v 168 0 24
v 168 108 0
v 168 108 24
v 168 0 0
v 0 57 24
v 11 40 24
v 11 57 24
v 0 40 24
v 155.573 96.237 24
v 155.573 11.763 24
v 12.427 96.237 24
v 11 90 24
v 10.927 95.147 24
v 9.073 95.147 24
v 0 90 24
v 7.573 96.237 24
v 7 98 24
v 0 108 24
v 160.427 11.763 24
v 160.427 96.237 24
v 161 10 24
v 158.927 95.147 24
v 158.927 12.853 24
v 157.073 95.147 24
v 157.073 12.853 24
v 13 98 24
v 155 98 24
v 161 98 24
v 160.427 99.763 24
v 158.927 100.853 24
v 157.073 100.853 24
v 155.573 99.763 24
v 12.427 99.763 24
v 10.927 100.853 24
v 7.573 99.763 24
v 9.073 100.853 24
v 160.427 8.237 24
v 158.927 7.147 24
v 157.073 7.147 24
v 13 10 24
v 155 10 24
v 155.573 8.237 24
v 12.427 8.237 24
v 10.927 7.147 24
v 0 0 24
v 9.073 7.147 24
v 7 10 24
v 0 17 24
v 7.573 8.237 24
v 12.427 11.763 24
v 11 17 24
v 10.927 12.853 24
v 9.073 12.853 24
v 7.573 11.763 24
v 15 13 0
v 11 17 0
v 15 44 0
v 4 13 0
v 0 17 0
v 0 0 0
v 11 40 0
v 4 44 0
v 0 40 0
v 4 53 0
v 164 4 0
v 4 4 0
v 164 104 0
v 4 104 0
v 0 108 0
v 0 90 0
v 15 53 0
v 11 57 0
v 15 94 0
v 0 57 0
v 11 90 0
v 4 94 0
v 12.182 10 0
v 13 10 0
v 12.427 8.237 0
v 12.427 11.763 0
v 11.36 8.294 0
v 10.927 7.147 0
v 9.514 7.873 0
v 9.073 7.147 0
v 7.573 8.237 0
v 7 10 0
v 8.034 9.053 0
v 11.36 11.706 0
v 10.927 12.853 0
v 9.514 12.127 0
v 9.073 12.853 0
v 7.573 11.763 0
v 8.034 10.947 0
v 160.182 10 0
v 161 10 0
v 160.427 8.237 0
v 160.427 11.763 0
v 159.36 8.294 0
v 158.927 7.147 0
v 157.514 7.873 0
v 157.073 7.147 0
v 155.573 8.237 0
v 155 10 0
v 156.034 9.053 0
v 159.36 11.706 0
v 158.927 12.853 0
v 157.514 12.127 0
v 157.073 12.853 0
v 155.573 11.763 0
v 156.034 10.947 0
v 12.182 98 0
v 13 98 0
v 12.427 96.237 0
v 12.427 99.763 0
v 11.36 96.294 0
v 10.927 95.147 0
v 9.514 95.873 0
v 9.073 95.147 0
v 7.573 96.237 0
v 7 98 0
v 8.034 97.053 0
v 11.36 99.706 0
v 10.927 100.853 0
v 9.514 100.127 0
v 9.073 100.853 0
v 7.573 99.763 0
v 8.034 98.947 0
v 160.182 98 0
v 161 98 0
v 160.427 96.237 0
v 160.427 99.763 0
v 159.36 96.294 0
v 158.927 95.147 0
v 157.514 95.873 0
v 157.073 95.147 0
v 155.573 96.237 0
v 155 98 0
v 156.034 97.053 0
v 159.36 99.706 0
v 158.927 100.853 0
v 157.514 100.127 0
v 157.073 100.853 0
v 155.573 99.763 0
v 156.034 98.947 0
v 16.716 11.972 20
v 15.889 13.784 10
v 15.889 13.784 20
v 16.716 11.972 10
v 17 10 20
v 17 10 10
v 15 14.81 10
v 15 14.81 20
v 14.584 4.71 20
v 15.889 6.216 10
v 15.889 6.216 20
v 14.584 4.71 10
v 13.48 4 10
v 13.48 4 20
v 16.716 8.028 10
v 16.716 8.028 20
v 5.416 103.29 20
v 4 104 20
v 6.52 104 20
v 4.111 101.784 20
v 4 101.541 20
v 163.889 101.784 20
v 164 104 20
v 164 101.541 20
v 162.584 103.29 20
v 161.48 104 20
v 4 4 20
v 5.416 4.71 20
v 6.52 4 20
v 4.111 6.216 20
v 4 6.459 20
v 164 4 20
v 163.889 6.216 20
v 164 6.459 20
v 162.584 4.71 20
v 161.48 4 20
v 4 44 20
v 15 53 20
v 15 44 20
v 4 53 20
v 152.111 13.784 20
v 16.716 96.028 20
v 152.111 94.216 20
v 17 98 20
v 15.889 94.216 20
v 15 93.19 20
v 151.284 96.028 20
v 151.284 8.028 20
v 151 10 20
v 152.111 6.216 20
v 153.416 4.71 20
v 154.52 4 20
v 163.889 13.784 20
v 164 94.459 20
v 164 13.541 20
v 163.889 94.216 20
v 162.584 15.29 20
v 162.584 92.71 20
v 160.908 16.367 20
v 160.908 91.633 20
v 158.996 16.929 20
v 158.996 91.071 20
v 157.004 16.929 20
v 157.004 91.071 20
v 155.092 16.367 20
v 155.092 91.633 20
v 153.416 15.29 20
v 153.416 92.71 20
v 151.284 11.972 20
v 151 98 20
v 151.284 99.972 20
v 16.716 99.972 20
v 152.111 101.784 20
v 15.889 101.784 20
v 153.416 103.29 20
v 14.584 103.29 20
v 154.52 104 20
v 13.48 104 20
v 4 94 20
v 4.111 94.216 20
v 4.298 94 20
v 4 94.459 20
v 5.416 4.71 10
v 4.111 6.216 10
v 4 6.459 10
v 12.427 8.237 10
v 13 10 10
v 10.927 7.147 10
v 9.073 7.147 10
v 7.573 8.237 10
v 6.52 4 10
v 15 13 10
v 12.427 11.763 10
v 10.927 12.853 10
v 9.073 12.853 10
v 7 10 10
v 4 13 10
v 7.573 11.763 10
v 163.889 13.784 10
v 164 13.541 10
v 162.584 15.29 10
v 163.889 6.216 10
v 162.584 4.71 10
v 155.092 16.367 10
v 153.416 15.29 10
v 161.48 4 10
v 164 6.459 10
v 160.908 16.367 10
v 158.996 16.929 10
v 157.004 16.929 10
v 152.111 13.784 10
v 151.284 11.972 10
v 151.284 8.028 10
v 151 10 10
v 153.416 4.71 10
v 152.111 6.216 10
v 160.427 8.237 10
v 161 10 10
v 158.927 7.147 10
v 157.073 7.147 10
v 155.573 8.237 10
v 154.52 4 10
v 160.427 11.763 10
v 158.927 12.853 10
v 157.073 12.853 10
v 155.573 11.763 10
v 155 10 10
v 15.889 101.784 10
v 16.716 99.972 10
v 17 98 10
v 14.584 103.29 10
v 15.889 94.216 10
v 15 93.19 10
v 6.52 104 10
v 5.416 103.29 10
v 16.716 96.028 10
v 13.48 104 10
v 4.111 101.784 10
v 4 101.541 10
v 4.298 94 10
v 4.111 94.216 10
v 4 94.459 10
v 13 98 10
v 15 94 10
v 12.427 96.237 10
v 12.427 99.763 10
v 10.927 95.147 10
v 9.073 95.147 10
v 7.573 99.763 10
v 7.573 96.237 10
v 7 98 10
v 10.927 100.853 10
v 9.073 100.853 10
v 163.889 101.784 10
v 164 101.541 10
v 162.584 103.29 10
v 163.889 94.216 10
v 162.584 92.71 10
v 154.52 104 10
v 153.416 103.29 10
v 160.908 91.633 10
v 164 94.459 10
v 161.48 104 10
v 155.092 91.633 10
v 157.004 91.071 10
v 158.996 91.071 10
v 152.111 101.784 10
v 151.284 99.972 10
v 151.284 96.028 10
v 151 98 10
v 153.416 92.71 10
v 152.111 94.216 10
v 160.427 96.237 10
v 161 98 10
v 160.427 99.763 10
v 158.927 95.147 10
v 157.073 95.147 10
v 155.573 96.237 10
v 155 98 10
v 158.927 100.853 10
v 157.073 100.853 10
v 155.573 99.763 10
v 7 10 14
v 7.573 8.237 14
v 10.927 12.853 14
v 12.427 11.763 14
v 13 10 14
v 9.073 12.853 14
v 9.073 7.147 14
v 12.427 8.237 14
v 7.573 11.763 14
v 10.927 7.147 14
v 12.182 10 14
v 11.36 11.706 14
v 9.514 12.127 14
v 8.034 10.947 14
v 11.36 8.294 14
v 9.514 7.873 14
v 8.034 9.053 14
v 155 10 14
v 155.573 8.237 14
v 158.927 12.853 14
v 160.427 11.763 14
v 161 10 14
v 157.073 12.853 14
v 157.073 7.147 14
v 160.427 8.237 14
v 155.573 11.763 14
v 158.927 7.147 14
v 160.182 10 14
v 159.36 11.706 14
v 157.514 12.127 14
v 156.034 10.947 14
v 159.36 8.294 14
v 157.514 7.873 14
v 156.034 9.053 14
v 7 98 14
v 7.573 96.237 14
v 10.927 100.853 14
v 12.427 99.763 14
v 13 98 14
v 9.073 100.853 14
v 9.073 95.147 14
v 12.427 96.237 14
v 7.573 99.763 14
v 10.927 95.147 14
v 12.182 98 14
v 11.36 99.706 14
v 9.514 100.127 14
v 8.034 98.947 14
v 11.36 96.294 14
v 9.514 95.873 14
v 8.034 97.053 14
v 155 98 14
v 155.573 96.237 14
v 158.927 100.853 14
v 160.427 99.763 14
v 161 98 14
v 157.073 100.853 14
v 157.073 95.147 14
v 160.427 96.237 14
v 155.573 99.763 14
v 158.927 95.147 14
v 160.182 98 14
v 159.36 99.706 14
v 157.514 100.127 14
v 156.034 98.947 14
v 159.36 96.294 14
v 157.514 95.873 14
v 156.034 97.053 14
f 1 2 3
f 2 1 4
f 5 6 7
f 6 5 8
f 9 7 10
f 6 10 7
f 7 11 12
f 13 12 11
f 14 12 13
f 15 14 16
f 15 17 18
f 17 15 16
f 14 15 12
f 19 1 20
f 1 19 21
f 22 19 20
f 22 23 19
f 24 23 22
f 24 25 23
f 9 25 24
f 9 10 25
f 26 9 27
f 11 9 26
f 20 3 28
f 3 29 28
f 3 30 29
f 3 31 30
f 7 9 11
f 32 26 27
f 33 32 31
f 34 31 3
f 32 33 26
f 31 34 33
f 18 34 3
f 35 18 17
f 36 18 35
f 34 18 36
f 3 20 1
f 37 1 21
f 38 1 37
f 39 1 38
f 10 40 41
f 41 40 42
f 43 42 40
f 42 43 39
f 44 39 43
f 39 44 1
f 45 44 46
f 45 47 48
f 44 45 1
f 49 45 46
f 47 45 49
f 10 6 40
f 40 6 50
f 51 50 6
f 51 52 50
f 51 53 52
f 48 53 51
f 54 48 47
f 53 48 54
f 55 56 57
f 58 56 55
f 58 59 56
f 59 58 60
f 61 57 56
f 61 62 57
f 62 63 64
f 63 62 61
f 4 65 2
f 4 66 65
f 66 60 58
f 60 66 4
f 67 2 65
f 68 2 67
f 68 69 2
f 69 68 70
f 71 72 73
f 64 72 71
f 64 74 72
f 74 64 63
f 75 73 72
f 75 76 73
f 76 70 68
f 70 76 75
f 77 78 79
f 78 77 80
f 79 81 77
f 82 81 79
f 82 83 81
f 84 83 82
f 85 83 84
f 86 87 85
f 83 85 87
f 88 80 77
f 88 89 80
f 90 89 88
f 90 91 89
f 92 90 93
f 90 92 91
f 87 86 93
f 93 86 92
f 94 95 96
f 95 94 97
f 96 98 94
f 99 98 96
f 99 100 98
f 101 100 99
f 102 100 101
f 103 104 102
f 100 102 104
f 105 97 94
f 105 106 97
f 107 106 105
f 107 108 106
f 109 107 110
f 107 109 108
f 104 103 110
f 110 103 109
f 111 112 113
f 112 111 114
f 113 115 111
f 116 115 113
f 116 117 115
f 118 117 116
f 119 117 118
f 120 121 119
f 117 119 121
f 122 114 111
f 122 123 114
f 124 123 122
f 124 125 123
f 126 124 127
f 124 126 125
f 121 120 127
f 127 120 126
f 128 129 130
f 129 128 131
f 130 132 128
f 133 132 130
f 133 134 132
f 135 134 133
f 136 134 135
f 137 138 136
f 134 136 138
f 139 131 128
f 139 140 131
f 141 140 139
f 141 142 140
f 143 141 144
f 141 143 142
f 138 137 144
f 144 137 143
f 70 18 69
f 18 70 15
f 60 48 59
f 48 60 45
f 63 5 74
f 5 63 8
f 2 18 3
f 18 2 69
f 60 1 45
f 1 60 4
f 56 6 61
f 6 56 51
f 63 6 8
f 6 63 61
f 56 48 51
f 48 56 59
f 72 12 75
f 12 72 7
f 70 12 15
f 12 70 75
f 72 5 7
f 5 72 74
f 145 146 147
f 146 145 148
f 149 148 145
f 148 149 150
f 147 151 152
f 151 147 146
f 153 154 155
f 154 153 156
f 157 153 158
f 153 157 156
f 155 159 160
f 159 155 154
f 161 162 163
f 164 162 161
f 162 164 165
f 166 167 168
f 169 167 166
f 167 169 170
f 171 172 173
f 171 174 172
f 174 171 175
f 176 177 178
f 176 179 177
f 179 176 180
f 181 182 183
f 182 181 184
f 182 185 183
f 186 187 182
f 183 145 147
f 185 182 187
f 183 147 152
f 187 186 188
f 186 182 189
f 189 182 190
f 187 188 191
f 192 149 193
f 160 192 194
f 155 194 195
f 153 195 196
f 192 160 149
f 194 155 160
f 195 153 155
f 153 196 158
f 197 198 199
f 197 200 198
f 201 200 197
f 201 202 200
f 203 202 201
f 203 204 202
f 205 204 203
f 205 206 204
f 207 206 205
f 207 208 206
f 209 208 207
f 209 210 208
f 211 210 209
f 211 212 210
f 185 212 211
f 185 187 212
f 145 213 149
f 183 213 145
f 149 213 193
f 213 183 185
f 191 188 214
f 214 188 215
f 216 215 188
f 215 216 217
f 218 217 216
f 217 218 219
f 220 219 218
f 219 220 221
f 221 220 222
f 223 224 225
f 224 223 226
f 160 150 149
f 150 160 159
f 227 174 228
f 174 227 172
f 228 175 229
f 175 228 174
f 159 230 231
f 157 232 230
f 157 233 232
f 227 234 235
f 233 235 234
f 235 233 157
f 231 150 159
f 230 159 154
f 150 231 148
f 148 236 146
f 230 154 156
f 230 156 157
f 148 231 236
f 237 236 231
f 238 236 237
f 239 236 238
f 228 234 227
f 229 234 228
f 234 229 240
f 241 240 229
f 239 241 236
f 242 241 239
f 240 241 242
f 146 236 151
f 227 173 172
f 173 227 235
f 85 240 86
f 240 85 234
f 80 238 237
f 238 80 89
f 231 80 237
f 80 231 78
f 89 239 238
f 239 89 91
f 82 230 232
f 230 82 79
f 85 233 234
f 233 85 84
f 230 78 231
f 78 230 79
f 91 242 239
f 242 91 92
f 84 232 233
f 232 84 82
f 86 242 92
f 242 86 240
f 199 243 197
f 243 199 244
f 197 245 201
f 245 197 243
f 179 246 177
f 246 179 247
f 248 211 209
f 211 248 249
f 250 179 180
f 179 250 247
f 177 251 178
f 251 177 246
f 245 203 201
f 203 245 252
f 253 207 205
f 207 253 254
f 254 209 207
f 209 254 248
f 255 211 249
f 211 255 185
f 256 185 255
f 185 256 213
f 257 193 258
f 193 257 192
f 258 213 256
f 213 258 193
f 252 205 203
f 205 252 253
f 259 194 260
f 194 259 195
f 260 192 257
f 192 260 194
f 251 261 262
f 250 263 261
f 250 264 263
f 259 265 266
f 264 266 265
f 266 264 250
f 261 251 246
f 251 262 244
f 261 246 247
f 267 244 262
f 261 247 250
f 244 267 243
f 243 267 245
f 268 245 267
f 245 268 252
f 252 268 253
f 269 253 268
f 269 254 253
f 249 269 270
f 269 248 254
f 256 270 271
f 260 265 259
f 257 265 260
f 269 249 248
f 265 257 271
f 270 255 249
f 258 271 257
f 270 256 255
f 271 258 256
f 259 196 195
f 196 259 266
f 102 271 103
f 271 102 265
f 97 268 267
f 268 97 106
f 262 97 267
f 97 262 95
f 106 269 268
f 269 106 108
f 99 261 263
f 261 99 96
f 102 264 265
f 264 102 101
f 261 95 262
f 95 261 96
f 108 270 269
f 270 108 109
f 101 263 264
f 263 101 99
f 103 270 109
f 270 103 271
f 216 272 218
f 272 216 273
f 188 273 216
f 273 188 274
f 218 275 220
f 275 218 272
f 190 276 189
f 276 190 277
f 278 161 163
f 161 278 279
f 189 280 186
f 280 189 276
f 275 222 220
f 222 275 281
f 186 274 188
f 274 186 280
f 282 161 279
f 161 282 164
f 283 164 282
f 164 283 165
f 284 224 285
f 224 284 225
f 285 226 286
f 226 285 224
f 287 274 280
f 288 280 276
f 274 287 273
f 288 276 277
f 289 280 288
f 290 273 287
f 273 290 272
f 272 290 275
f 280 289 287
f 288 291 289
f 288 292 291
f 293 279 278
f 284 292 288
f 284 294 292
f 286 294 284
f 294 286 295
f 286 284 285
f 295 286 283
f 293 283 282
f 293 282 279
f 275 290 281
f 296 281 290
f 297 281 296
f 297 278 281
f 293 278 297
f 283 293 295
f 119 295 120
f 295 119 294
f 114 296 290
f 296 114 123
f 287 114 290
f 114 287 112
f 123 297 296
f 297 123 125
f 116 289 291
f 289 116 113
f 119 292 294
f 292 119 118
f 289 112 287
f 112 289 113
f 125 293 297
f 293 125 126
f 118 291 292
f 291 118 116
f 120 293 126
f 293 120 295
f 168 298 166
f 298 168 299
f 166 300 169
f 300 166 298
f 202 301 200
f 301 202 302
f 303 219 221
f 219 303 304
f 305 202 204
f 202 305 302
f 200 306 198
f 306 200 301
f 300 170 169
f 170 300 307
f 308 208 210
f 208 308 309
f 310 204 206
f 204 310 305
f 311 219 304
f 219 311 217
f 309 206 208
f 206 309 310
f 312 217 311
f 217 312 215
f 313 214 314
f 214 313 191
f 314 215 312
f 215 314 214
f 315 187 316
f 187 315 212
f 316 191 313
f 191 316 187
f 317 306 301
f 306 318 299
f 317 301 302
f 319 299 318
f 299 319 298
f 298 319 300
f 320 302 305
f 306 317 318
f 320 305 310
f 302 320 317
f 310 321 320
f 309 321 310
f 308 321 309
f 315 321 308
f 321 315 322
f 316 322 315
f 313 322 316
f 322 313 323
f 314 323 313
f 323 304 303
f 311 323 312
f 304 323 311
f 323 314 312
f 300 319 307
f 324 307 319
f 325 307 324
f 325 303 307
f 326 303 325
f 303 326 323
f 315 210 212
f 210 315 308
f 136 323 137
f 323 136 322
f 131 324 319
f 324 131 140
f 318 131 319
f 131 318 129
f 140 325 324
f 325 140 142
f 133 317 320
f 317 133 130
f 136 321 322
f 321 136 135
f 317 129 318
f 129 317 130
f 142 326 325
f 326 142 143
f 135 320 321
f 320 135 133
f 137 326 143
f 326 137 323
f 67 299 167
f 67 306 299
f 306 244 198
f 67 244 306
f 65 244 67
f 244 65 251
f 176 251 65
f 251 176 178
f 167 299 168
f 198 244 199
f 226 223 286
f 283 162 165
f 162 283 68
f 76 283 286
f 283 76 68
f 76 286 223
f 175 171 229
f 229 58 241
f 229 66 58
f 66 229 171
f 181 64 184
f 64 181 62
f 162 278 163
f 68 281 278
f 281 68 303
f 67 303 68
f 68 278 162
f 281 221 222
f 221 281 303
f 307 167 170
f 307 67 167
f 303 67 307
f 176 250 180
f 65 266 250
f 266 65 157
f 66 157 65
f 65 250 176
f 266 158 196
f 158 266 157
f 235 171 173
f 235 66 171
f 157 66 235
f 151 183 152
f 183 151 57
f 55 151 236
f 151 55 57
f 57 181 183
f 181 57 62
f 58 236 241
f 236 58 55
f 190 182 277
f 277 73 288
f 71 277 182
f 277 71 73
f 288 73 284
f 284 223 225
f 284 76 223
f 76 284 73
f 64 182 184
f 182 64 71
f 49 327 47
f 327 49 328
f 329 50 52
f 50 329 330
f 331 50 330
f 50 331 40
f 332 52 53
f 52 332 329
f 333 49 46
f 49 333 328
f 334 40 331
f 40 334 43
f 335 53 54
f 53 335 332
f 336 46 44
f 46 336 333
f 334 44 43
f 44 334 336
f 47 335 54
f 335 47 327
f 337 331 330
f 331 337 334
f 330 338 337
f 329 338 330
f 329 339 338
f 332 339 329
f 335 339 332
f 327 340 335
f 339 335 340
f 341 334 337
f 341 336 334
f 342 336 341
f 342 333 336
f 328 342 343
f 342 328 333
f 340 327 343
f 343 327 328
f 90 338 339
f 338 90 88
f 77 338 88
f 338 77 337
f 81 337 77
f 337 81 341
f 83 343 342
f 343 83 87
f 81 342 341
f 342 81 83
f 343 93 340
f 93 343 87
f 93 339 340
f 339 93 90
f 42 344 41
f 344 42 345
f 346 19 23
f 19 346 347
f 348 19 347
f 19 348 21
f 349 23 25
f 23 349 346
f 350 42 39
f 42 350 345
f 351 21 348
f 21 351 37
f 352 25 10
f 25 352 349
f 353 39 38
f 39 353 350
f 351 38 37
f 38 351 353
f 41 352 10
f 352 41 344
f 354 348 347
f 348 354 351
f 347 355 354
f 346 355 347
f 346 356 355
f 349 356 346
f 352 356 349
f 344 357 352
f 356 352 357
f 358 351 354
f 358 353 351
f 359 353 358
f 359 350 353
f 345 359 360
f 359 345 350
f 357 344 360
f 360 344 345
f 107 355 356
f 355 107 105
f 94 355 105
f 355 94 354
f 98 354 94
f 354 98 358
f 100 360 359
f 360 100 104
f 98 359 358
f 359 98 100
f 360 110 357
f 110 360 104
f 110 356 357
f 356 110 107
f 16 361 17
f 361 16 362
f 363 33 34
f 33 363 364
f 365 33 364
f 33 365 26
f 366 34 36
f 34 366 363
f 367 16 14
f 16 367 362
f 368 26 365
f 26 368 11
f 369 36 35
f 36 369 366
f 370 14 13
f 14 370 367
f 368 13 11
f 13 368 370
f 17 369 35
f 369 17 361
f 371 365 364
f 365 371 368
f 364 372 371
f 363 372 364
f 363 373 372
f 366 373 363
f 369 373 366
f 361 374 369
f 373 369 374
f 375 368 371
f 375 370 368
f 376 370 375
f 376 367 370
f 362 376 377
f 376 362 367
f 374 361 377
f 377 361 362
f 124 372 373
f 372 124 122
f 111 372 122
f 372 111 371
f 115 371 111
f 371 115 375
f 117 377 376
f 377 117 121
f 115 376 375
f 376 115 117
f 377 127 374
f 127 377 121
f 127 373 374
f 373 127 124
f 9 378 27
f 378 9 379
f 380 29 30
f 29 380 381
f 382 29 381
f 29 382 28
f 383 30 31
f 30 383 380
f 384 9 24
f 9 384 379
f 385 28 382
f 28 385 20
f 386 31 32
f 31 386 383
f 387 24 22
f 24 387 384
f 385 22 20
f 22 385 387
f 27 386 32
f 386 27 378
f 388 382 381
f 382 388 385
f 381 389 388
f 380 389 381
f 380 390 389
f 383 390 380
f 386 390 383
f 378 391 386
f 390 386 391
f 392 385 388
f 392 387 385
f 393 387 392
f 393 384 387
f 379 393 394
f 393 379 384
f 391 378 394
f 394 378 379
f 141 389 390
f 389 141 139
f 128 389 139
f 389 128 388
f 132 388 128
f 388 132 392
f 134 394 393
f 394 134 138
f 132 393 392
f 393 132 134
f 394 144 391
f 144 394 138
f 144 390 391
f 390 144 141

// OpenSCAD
/* Top portion of the enclosure for:
 * Sequential Turn Signal
 *
 * This part can be constructed out of metal, plastic, or wood,
 * but metal is recommended.  The enclosure should be mounted in
 * a dry, well-ventilated area as it will not prevent moisture
 * ingress or provide thermal insulation for the electronics.
 */

inner_x = 160;          // Interior dimension of enclosure in x direction.
inner_y = 100;          // Interior dimension of enclosure in y direction.
inner_z = 20;           // Interior dimension of enclosure in z direction.
inner_z_min = 10;        // Minimum distance between top of enclosure and PCB.
wall_d = 4;             // Enclosure wall thickness.
mount_r = 3;            // Radius of PCB mounting posts.
screw_inset = 6;        // Distance from closest edge of PCB to center of screw.
screw_r = 3;            // Screw head radius.
thread_outer_r = 2.182; // Mounting screw outer radius.
pwr_inset_x = 11;       // Size of power connector in x direction.
pwr_inset_y = 23;       // Size of power connector in the y direction.
pwr_offset = 13;        // Offset from origin along y axis to power connector.
sig_inset_x = 11;       // Size of signal connector in x direction.
sig_inset_y = 33;       // Size of signal connector in y direction.
sig_offset = 53;        // Offset from origin along y axis to signal connector.
eps = 0.001;            // Epsilon constant to ensure overlap for difference().

// The top portion of the enclosure.
module top()
{

  // Exterior shell of the top of the enclosure.
  module exterior()
  {
    difference()
    {
      cube([inner_x + 2 * wall_d, inner_y + 2 * wall_d, inner_z + wall_d]);
      translate([-eps, pwr_offset + wall_d, -eps])
      {
        cube([pwr_inset_x + eps, pwr_inset_y, inner_z + wall_d + 2 * eps]);
      }
      translate([-eps, sig_offset + wall_d, -eps]) {
         cube([sig_inset_x + eps, sig_inset_y, inner_z + wall_d + 2 * eps]);
      }
    }
  }

  // Mounting stub which contacts the PCB at the screw holes.
  module mount()
  {
    translate([0, 0, inner_z_min])
    {
      cylinder(r=screw_r + wall_d, h=inner_z_min);
    }
    cylinder(r=mount_r, h=inner_z);
  }

  // Interior volume of the top of the enclosure.
  module interior()
  {
    difference()
    {
      translate([0, 0, -eps]) cube([inner_x, inner_y, inner_z + eps]);
      translate([-eps, pwr_offset - wall_d, -2 * eps])
      {
        cube([pwr_inset_x + eps, pwr_inset_y + 2 * wall_d, inner_z + 4 * eps]);
      }
      translate([-eps, sig_offset - wall_d, -2 * eps])
      {
        cube([sig_inset_x + eps, sig_inset_y + 2 * wall_d, inner_z + 4 * eps]);
      }
      translate([screw_inset, screw_inset, 0]) mount();
      translate([inner_x - screw_inset, screw_inset, 0]) mount();
      translate([screw_inset, inner_y - screw_inset, 0]) mount();
      translate([inner_x - screw_inset, inner_y - screw_inset, 0]) mount();
    }
  }

  // Holes for screws to attach the top and bottom portions of the enclosure.
  module screw_holes()
  {

    // Screw hole centered on the origin.
    module hole()
    {
      translate([0, 0, inner_z_min + wall_d])
      {
        cylinder(r=screw_r, h=inner_z_min + wall_d);
      }
      translate([0, 0, -eps])
      {
        cylinder(r=thread_outer_r, h=inner_z + wall_d + eps);
      }
    }

    // Copy the hole at the correct locations.
    translate([screw_inset, screw_inset, 0]) hole();
    translate([inner_x - screw_inset, screw_inset, 0]) hole();
    translate([screw_inset, inner_y - screw_inset, 0]) hole();
    translate([inner_x - screw_inset, inner_y - screw_inset, 0]) hole();

  }

  /* Construct the top portion of the enclosure by removing the interior
   * volume and the screw holes from the volume bounded by the exterior.
   */
  difference()
  {
    exterior();
    translate([wall_d, wall_d, 0]) interior();
    translate([wall_d, wall_d, 0]) screw_holes();
  }

}

top();
